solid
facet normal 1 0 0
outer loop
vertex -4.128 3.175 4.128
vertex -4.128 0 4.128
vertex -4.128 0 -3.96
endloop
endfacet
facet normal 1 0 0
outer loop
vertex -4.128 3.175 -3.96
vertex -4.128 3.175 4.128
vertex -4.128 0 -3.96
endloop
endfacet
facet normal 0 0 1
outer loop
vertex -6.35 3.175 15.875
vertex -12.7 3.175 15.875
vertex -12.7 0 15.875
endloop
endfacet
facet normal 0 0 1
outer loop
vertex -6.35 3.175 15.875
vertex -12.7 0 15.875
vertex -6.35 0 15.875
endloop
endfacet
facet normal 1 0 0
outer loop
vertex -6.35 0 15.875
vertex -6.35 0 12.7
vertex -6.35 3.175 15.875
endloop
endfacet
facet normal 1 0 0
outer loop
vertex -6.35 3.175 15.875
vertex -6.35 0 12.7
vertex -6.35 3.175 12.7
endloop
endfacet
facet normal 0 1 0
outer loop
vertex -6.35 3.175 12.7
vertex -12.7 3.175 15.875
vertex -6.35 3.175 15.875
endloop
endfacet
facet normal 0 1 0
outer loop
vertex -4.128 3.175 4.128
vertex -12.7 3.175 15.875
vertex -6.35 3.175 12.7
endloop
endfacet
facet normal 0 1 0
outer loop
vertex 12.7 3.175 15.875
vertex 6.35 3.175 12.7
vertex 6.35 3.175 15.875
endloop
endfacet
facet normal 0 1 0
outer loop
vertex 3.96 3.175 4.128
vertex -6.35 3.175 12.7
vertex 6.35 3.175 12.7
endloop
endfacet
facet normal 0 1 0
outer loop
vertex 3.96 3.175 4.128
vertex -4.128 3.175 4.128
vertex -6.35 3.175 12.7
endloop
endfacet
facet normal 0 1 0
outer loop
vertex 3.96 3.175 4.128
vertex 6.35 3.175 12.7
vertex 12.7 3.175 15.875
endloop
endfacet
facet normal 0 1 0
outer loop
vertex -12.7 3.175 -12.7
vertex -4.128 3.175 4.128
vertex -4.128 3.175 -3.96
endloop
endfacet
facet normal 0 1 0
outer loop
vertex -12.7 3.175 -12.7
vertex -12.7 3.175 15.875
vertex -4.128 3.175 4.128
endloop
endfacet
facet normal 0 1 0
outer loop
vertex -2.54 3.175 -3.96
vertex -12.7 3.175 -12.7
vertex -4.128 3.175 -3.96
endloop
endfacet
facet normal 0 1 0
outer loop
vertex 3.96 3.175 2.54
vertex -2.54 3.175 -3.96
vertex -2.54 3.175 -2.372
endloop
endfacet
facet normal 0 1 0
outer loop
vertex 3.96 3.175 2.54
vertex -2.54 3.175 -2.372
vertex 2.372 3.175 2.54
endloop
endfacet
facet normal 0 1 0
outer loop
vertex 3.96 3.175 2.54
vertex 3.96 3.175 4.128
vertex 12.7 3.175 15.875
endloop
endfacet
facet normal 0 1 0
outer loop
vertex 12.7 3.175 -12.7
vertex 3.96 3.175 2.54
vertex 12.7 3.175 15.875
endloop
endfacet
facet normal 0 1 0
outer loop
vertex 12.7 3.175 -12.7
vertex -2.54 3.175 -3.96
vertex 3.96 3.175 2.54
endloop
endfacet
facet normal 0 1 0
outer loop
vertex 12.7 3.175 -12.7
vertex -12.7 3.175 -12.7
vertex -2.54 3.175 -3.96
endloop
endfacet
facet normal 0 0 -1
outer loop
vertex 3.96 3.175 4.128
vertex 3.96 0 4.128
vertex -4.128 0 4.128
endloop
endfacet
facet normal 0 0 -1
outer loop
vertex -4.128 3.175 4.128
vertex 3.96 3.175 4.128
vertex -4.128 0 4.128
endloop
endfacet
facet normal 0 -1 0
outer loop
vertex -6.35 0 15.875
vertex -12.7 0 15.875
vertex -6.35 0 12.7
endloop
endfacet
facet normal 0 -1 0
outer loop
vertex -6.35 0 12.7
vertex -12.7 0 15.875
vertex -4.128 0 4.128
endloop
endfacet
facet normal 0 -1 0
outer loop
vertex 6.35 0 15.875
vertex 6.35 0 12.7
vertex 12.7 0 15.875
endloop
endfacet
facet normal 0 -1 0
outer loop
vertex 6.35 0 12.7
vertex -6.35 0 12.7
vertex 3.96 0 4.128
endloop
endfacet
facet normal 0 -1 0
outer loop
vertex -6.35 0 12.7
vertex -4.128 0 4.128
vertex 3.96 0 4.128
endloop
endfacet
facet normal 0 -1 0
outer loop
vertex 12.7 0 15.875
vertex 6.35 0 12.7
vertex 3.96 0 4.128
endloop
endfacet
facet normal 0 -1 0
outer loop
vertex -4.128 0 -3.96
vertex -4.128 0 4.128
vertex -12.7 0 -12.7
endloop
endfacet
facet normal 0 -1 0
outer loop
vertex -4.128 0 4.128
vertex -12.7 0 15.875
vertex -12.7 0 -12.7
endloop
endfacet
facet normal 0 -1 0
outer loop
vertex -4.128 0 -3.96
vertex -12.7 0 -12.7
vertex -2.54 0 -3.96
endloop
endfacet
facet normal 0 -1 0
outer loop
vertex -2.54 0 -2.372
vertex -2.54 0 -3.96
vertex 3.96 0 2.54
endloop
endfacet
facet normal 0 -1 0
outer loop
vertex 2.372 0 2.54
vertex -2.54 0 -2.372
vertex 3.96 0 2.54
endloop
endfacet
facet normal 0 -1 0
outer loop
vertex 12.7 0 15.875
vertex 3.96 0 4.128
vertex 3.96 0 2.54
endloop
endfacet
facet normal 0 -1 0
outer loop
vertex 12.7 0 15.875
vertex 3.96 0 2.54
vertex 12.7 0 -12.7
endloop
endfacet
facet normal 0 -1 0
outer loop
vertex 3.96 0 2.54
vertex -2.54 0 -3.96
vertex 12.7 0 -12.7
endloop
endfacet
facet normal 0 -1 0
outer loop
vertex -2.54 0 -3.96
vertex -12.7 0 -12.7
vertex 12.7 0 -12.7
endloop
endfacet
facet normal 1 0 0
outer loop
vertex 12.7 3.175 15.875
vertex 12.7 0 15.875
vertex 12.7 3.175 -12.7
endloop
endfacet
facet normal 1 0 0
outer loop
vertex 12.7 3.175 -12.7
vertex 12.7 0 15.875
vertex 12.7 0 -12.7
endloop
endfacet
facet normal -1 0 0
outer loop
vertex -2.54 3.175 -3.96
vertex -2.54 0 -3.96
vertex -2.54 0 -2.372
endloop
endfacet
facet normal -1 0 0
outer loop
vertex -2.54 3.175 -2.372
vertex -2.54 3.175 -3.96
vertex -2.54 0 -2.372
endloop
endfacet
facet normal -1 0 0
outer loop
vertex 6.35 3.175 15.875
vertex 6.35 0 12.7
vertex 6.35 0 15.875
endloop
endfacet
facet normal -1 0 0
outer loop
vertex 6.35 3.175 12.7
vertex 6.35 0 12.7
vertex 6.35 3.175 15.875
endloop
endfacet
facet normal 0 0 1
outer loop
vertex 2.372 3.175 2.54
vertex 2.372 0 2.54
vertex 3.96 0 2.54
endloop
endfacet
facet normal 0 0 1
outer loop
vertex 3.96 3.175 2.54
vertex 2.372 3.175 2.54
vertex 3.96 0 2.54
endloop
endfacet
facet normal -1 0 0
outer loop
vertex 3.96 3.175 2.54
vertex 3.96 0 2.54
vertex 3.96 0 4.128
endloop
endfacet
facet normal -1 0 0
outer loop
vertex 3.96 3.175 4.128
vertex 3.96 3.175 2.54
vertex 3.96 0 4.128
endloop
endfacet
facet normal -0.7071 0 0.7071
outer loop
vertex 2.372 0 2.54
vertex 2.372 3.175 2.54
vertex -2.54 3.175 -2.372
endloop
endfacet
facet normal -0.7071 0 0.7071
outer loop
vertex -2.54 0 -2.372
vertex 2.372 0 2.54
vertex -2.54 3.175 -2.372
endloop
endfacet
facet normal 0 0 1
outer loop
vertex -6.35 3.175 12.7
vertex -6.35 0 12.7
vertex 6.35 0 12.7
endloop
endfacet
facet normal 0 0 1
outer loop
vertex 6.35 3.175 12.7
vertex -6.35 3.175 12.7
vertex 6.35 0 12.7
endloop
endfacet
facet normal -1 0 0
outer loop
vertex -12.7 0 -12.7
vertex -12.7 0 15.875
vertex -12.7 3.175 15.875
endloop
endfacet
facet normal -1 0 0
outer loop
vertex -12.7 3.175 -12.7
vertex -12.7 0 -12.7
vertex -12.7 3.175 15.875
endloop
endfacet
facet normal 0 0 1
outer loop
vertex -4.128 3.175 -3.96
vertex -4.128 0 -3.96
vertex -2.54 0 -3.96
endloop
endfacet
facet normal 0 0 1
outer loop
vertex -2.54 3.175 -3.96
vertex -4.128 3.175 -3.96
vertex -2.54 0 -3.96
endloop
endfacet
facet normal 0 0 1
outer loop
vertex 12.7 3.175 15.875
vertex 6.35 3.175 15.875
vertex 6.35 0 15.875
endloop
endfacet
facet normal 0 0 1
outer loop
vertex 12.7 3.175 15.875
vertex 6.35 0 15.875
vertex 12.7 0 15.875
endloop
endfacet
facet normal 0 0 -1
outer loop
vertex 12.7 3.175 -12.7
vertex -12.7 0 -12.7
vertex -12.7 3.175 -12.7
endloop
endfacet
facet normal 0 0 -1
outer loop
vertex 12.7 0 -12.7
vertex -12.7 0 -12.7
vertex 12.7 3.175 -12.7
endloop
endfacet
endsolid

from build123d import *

# Parameters (mm, degrees)
SKETCH1_W           = 25.4
SKETCH1_H           = 25.4
BOSS_EXTRUDE1_DEPTH = 3.175
SKETCH2_W           = 6.35
SKETCH2_H           = 3.175
BOSS_EXTRUDE2_DEPTH = 3.175
CUT_EXTRUDE1_DEPTH  = 6.35


with BuildPart() as part:
    # Sketch1 → Boss-Extrude1 (new body)
    with BuildSketch(Plane(origin=(0, 0, 0), x_dir=(1, 0, 0), z_dir=(0, 1, 0))):
        Rectangle(SKETCH1_W, SKETCH1_H)
        Polygon((-4.1275, -4.1275), (-4.1275, 3.95986), (-2.54, 3.95986), (-2.54, -2.54), (3.95986, -2.54), (3.95986, -4.1275), align=None, mode=Mode.SUBTRACT)
    extrude(amount=BOSS_EXTRUDE1_DEPTH)

    # Sketch2 → Boss-Extrude2 (add)
    with BuildSketch(Plane.XY.offset(12.7)):
        with Locations((-9.525, 1.5875)):
            Rectangle(SKETCH2_W, SKETCH2_H)
        with Locations((9.525, 1.5875)):
            Rectangle(SKETCH2_W, SKETCH2_H)
    extrude(amount=BOSS_EXTRUDE2_DEPTH)

    # Sketch3 → Cut-Extrude1 (cut)
    with BuildSketch(Plane(origin=(0, 3.175, 0), x_dir=(1, 0, 0), z_dir=(0, 1, 0))):
        Polygon((-2.54, 2.37236), (-2.54, -2.54), (2.37236, -2.54), align=None)
    extrude(amount=-CUT_EXTRUDE1_DEPTH, mode=Mode.SUBTRACT)


solid = part.part
